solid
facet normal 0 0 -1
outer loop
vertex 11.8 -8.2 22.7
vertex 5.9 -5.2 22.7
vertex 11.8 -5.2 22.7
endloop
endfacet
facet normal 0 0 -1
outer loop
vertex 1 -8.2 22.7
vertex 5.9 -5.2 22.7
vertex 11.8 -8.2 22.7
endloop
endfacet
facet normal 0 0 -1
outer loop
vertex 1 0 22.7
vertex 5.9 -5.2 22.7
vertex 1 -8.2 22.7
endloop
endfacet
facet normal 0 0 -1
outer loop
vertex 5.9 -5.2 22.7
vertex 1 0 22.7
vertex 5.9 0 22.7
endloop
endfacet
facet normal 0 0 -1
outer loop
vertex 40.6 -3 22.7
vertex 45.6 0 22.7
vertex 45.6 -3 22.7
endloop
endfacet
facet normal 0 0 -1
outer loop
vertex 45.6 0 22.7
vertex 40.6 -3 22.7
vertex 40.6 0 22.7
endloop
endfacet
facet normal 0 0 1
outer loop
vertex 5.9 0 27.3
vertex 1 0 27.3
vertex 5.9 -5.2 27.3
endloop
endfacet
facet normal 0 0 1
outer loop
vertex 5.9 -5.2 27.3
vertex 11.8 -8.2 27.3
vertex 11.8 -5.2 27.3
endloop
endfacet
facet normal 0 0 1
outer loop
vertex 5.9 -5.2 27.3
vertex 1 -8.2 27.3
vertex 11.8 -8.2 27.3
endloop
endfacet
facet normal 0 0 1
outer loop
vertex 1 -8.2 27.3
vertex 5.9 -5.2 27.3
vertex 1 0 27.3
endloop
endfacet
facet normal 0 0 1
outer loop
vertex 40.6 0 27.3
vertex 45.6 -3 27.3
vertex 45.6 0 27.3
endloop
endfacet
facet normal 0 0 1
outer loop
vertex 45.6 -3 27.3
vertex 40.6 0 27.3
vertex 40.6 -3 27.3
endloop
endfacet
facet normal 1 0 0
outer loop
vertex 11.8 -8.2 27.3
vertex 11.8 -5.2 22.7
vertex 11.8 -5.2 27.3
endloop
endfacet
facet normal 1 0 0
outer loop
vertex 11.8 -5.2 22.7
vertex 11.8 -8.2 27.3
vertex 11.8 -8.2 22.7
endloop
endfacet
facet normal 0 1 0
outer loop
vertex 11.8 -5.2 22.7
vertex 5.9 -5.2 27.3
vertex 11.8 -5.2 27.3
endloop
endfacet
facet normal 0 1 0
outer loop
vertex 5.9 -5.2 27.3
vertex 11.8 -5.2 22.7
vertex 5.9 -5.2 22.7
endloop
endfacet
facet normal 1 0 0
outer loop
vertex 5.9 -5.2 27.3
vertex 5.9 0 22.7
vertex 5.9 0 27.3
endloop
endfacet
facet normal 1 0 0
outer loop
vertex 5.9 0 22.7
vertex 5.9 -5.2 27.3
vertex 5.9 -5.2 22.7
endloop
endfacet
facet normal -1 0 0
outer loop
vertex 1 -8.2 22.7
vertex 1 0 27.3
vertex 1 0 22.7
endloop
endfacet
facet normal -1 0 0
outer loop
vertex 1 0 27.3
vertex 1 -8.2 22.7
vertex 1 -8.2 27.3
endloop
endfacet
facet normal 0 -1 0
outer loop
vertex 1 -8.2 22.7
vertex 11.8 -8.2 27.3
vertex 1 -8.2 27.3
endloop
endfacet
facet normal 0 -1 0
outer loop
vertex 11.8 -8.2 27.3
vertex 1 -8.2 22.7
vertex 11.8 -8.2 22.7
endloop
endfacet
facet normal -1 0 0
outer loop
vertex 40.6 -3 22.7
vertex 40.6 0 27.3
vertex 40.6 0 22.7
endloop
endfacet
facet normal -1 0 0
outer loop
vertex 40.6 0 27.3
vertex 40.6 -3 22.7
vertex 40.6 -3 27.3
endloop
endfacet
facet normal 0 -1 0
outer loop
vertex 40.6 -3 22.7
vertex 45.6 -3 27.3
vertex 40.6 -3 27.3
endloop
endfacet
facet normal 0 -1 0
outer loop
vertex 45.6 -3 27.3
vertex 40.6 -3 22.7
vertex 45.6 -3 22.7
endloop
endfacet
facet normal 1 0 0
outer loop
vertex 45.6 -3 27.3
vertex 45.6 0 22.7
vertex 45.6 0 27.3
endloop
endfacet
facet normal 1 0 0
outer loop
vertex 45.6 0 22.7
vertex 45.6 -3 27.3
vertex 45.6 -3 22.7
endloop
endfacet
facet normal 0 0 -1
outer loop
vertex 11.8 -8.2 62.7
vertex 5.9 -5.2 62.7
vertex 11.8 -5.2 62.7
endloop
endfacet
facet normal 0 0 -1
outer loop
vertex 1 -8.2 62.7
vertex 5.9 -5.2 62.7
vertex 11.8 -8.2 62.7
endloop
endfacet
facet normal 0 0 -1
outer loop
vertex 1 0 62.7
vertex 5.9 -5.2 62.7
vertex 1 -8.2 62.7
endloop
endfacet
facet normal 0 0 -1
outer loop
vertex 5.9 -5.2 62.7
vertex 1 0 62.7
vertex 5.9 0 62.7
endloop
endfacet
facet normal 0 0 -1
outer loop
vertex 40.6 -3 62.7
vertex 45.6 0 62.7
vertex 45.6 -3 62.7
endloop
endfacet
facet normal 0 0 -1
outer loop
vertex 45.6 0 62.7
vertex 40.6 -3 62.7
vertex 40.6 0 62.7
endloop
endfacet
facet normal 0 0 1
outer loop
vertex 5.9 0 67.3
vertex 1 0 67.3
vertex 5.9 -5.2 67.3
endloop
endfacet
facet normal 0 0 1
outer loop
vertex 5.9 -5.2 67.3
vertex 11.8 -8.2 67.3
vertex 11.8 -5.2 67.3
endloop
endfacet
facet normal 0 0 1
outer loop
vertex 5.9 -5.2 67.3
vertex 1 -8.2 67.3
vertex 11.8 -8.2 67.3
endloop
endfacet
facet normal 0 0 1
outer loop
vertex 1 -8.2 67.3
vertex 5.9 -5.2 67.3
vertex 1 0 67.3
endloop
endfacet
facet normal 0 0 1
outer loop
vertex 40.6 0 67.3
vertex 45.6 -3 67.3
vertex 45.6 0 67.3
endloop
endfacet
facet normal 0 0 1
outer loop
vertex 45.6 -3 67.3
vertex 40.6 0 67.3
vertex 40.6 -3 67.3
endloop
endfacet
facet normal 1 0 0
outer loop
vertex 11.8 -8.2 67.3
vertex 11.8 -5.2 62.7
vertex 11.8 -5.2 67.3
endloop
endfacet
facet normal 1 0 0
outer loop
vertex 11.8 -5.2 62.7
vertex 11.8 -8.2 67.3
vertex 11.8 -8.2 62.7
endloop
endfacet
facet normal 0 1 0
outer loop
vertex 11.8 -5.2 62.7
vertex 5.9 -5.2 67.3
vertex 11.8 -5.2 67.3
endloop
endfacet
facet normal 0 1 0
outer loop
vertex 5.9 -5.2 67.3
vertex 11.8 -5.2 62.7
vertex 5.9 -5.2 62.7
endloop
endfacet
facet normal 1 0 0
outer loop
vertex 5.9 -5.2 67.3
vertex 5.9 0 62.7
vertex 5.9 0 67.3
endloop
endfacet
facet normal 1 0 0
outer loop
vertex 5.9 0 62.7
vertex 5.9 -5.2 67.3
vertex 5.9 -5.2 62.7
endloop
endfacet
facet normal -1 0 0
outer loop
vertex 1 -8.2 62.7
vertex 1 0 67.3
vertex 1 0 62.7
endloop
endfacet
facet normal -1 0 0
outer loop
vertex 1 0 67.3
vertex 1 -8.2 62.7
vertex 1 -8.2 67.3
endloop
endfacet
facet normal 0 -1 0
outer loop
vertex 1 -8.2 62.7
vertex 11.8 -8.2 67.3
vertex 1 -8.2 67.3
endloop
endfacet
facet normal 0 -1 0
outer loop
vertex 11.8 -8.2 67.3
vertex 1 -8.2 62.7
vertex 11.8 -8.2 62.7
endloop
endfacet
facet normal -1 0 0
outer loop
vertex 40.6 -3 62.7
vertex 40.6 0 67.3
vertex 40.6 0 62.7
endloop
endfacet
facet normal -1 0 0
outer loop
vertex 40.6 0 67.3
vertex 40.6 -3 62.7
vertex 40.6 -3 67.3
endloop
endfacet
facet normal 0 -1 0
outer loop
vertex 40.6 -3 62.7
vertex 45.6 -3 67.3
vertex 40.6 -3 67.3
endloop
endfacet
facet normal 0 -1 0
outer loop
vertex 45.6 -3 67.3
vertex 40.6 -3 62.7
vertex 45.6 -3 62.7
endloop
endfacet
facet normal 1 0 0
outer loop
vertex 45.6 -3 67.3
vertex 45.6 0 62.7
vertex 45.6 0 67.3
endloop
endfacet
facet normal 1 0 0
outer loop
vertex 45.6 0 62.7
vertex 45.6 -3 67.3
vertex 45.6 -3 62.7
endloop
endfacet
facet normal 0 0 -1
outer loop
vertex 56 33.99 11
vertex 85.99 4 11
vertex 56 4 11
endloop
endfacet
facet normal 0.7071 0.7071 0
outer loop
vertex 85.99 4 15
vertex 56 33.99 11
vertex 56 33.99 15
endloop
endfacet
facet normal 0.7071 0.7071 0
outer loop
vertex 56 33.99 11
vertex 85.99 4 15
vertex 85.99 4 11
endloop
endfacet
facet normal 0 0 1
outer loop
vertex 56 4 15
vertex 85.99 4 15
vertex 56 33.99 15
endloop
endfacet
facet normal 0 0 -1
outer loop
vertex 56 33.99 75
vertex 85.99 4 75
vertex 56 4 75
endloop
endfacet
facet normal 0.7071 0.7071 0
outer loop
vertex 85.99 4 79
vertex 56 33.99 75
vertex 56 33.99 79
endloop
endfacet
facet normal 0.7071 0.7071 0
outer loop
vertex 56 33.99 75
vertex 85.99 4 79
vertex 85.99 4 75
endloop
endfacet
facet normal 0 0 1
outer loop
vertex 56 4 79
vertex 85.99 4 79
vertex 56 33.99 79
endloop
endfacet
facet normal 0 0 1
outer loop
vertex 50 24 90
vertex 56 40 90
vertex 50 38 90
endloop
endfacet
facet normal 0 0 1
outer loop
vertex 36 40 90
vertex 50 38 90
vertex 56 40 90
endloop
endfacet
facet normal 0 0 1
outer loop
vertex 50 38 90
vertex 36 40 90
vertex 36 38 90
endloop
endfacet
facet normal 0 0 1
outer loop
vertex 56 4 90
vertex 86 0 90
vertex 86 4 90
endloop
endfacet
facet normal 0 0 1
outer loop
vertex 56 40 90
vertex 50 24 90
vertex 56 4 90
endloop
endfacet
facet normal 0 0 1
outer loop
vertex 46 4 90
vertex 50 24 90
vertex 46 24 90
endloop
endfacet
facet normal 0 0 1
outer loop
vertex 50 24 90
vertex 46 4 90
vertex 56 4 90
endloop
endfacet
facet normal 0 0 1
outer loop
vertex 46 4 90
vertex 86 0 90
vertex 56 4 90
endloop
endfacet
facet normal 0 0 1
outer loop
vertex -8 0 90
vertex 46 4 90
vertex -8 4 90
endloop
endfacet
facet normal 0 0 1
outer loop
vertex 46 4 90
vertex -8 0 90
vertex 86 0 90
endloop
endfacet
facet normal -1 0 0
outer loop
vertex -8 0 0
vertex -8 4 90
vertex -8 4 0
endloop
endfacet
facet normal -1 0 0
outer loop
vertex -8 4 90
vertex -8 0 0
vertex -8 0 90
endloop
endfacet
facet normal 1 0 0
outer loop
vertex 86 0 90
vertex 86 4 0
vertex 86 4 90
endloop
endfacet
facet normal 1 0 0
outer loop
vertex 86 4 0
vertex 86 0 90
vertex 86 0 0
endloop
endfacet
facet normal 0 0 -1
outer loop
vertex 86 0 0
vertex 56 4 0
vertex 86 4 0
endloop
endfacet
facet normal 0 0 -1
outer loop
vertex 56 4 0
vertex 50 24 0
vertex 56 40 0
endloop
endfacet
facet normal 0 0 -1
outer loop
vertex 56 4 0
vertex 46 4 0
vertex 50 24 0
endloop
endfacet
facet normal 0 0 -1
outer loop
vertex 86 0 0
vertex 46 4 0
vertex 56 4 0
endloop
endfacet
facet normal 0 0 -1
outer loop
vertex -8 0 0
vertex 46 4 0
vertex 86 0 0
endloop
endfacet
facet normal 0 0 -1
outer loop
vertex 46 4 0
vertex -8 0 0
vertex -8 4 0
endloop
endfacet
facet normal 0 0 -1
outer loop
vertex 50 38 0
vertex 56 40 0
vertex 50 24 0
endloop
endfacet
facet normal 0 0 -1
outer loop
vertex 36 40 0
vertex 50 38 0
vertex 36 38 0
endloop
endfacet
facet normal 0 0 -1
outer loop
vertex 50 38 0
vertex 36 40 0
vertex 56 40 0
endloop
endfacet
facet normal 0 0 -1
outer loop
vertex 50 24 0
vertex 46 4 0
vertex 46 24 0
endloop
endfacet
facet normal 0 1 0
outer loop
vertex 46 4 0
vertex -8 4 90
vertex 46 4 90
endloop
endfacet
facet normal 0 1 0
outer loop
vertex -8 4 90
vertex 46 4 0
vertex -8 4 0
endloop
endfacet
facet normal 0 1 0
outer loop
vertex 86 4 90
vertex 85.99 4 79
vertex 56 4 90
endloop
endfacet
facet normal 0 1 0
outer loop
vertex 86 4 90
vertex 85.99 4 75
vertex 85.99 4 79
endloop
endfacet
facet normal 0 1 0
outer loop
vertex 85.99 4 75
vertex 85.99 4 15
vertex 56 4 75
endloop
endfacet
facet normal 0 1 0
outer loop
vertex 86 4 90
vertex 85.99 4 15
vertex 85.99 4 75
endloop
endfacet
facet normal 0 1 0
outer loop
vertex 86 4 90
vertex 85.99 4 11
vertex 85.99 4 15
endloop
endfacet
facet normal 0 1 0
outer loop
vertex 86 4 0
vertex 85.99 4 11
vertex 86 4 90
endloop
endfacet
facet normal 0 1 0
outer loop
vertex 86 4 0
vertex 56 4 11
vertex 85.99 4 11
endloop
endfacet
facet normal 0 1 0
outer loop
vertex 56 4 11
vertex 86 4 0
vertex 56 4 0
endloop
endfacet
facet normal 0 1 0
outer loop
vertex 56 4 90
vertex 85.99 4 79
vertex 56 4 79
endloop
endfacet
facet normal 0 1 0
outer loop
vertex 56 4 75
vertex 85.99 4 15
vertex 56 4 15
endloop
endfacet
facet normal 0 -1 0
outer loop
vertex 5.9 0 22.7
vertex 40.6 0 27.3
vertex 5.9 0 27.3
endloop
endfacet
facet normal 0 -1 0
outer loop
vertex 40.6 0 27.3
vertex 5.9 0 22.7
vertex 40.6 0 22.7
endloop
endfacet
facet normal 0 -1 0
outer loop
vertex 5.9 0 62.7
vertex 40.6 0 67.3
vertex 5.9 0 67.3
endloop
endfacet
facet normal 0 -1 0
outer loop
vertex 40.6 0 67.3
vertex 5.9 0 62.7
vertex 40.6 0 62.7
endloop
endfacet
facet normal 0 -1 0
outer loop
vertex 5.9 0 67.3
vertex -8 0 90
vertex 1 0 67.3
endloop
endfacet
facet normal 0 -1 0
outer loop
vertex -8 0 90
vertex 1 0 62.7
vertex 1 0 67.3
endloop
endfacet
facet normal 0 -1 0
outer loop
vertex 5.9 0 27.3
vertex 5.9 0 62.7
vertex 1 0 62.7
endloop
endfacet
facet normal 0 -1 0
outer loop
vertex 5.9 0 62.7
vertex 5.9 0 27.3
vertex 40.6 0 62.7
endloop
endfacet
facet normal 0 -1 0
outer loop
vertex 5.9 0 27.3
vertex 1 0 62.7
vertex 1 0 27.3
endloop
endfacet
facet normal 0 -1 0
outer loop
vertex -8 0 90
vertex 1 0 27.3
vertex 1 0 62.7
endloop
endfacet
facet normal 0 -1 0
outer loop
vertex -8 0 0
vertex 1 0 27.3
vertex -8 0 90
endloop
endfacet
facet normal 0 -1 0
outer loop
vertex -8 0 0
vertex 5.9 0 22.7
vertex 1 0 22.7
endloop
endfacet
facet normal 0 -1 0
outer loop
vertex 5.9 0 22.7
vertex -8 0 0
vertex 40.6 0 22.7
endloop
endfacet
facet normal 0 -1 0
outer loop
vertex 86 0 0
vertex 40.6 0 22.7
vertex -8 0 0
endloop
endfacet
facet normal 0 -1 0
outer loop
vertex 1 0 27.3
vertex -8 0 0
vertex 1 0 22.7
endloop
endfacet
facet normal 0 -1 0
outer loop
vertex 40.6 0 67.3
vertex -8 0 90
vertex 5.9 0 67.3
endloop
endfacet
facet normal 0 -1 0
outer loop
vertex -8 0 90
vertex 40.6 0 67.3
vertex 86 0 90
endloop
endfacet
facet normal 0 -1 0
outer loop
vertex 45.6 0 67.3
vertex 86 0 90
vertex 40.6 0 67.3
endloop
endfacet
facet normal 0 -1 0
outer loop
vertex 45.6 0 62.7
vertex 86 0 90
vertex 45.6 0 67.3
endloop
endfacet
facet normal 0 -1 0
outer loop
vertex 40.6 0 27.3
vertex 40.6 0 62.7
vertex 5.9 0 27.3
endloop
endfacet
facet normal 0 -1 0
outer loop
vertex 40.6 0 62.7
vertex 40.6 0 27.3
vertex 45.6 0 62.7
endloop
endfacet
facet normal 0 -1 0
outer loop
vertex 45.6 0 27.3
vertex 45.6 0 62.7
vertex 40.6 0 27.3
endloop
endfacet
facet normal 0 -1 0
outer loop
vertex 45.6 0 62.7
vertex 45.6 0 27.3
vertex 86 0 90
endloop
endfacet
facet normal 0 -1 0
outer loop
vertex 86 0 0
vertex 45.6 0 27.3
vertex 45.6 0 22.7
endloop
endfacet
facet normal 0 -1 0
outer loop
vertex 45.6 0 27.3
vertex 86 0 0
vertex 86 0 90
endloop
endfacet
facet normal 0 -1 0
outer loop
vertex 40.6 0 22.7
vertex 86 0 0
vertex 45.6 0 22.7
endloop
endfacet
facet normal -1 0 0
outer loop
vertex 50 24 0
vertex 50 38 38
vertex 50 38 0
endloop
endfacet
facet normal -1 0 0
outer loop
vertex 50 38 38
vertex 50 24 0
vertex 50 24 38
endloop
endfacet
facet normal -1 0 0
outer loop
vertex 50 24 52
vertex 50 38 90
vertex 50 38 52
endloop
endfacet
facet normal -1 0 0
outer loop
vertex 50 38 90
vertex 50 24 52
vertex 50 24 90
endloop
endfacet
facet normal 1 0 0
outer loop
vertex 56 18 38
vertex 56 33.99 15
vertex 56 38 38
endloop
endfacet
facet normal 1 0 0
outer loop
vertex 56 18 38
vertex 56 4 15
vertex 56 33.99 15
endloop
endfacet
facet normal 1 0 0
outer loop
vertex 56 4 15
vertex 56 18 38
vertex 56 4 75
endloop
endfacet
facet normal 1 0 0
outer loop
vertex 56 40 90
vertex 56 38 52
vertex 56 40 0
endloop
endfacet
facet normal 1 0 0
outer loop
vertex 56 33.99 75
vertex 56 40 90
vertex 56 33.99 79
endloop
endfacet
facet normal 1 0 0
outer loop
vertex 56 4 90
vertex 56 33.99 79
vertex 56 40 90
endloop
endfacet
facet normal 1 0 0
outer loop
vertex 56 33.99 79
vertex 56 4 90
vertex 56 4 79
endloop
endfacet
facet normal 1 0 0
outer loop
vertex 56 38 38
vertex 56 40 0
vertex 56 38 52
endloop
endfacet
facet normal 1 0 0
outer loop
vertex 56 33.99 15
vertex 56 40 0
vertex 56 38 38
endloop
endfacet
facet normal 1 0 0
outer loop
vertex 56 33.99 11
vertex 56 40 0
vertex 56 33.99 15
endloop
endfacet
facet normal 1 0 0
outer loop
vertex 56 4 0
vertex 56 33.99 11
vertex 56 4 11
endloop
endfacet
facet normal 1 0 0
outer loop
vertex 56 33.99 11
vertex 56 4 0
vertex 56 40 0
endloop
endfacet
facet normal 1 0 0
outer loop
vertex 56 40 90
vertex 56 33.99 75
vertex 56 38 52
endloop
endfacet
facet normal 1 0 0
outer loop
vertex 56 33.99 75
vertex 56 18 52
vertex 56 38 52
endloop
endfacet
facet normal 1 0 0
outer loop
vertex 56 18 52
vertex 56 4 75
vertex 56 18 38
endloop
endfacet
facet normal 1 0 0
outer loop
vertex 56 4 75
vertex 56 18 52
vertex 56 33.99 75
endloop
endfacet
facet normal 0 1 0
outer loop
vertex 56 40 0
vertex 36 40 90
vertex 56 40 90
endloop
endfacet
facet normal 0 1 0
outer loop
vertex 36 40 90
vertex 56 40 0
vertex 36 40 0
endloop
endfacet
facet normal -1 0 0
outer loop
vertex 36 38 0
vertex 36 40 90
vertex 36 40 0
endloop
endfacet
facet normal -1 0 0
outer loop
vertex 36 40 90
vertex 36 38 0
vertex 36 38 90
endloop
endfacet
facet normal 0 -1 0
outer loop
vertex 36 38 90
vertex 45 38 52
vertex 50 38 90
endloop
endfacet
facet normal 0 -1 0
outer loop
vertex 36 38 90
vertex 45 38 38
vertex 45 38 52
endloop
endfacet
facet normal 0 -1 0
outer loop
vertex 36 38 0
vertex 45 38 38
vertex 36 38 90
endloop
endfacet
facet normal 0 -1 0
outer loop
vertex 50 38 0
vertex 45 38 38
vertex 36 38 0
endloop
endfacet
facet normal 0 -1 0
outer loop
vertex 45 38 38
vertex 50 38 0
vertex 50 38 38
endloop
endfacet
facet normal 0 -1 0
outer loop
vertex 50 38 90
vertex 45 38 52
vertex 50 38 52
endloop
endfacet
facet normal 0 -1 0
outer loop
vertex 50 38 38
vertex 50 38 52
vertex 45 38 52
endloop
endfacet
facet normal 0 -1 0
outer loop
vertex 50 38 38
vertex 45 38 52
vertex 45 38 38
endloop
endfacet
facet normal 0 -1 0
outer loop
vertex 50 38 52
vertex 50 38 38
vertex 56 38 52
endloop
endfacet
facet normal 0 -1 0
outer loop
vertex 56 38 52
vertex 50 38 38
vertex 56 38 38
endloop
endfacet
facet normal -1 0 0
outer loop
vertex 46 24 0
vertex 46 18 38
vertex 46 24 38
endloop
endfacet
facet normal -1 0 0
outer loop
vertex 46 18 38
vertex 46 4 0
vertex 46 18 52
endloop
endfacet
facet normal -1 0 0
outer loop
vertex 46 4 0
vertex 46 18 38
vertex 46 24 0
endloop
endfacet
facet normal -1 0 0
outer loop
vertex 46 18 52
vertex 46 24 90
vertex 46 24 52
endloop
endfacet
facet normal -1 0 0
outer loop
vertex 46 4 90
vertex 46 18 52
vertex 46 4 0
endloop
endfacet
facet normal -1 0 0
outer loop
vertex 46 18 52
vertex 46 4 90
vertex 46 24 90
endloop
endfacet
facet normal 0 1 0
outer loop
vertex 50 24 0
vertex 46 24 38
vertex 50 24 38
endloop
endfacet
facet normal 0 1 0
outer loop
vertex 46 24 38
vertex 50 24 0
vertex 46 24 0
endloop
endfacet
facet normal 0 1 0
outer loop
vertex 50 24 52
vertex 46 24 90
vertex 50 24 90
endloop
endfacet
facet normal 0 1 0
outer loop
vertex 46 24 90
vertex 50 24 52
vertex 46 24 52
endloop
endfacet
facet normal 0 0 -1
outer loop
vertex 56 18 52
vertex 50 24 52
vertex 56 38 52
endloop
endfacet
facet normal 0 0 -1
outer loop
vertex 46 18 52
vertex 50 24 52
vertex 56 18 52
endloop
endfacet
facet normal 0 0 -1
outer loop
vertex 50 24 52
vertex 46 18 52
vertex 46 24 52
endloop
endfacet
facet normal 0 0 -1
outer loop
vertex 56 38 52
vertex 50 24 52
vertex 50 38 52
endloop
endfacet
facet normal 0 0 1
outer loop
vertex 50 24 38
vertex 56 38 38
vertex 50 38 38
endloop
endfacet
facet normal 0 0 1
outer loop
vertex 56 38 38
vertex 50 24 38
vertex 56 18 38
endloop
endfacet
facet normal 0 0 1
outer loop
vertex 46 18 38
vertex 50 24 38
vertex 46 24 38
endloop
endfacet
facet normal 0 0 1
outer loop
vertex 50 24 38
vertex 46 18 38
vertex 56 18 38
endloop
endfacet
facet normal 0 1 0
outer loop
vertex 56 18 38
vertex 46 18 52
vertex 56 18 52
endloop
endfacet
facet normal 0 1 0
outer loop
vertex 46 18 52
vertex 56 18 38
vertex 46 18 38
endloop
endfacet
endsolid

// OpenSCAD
// file: skadis-lib.scad
// Shared pieces for the SKÅDIS accessories. Not printed on its own.
//
// Frame for an accessory: the board's FRONT face is the plane y = 0 (the board fills
// y -5..0), x runs across the board, z up, and z = 0 is the centre of the slot the upper
// hanger uses. Every accessory is built in this frame and saved with as_print(), which lays
// it on its side (x becomes the print's z), so the hangers print with their layers running
// along the lip and nothing needs support.
//
// The hanger is IKEA's own way of holding on, proven on skadis-hook.scad: a 4.6 mm wide tab
// goes through a slot and a lip behind the board drops 5.9 mm below the slot; a short peg
// sits in the slot 40 mm below so the piece cannot tip, swing or lift by accident. Lift it
// 6 mm to take it off. Two hangers 40 mm apart (two slots of one row) carry anything heavy.
//
// Profile (u out from the front face, v up from the upper slot's centre), dropped position:
//   tab  u -5.2..0,    v -5.9..-1    rests on the slot's rounded bottom (-5.98 for a 4.6 tab)
//   lip  u -8.2..-5.2, v -11.8..-1   5.8 mm of board behind it
//   peg  u -3..0,      v -45.6..-40.6
// Raised 5.9 for fitting, the tab and lip (10.8 tall) pass the slot, whose straight height
// for a 4.6 mm part is 11.96; the peg stays inside the lower slot (usable -45.98..-34.02).

hanger_w = 4.6;
hanger_drop = 5.9;
hanger_bottom = -45.6;        // the lowest point of a hanger (the peg's bottom)
key_len = 13; key_neck = 5; key_tip = 11; key_depth = 3.5;
key_poly = [[-key_len / 2, -key_tip / 2], [-key_len / 2, key_tip / 2], [0, key_neck / 2], [key_len / 2, key_tip / 2], [key_len / 2, -key_tip / 2], [0, -key_neck / 2]];

module hanger2d() {
    translate([-5.2, -5.9]) square([5.2 + 0.01, 4.9]);
    translate([-8.2, -11.8]) square([3, 10.8]);
    translate([-3, -45.6]) square([3 + 0.01, 5]);
}
// extrude a 2D (u, v) profile along x, from x0 to x0 + w
module along_x(x0, w) multmatrix([[0, 0, 1, x0], [1, 0, 0, 0], [0, 1, 0, 0], [0, 0, 0, 1]]) linear_extrude(w) children();
module hanger(x) along_x(x - hanger_w / 2, hanger_w) hanger2d();
module hangers(xs) for (x = xs) hanger(x);
// a slab from the front face: u 0..t, v v0..v1, x x0..x1 (the spine that sits on the board)
module spine(x0, x1, v0, v1, t = 4) translate([x0, 0, v0]) cube([x1 - x0, t, v1 - v0]);
// lay the finished accessory on its side for printing: x up, lying on its x = 0 face
module as_print() rotate([0, -90, 0]) children();
// rounded 2D rectangle, for arms and lips
module rr(w, h, r) offset(r = r, $fn = 24) offset(delta = -r) square([w, h]);
// main file
// Phone dock for the SKÅDIS board: the phone stands in a 14 mm channel 20 mm out from the
// board and leans back on it (about 10° for a 150 mm phone), with a 14 mm notch under it
// for the charging plug and a groove behind for the lead to run down. 90 wide takes any
// phone in a case. Two hangers. Print on the side, as saved, PETG, 4 walls, 25 %. x1
//   openscad -o skadis-phone-dock-x1.stl skadis-phone-dock.scad

include <skadis-lib.scad>

W = 90; D = 36; t = 6; spine_t = 4; chan0 = 20; chan1 = 34; lip = 14; notch = 14; gusset = 30;
v_top = -50;
hx = [W / 2 - 20, W / 2 + 20];

module piece() {
    difference() {
        union() {
            hangers(hx);
            spine(0, W, v_top - t - gusset, 8, spine_t);
            translate([0, 0, v_top - t]) cube([W, spine_t + D, t]);                       // the plate
            translate([0, spine_t + chan1, v_top - t]) cube([W, D - chan1, t + lip]);      // the lip in front of the channel
            translate([0, spine_t, v_top - t]) cube([W, chan0, t + 4]);                    // a 4 mm step behind the channel: the phone's foot sits on it, the lead runs under
            for (x = [W / 2 - 32, W / 2 + 32]) translate([x - 2, 0, 0]) rotate([90, 0, 90]) linear_extrude(4)
                polygon([[spine_t - 0.01, v_top - t + 0.01], [spine_t + gusset, v_top - t + 0.01], [spine_t - 0.01, v_top - t - gusset]]);
        }
        translate([W / 2 - notch / 2, spine_t + chan0 - 6, v_top - t - 1]) cube([notch, chan1 - chan0 + 6, t + 6]);   // plug notch, through the plate, into the step
    }
}
as_print() piece();
